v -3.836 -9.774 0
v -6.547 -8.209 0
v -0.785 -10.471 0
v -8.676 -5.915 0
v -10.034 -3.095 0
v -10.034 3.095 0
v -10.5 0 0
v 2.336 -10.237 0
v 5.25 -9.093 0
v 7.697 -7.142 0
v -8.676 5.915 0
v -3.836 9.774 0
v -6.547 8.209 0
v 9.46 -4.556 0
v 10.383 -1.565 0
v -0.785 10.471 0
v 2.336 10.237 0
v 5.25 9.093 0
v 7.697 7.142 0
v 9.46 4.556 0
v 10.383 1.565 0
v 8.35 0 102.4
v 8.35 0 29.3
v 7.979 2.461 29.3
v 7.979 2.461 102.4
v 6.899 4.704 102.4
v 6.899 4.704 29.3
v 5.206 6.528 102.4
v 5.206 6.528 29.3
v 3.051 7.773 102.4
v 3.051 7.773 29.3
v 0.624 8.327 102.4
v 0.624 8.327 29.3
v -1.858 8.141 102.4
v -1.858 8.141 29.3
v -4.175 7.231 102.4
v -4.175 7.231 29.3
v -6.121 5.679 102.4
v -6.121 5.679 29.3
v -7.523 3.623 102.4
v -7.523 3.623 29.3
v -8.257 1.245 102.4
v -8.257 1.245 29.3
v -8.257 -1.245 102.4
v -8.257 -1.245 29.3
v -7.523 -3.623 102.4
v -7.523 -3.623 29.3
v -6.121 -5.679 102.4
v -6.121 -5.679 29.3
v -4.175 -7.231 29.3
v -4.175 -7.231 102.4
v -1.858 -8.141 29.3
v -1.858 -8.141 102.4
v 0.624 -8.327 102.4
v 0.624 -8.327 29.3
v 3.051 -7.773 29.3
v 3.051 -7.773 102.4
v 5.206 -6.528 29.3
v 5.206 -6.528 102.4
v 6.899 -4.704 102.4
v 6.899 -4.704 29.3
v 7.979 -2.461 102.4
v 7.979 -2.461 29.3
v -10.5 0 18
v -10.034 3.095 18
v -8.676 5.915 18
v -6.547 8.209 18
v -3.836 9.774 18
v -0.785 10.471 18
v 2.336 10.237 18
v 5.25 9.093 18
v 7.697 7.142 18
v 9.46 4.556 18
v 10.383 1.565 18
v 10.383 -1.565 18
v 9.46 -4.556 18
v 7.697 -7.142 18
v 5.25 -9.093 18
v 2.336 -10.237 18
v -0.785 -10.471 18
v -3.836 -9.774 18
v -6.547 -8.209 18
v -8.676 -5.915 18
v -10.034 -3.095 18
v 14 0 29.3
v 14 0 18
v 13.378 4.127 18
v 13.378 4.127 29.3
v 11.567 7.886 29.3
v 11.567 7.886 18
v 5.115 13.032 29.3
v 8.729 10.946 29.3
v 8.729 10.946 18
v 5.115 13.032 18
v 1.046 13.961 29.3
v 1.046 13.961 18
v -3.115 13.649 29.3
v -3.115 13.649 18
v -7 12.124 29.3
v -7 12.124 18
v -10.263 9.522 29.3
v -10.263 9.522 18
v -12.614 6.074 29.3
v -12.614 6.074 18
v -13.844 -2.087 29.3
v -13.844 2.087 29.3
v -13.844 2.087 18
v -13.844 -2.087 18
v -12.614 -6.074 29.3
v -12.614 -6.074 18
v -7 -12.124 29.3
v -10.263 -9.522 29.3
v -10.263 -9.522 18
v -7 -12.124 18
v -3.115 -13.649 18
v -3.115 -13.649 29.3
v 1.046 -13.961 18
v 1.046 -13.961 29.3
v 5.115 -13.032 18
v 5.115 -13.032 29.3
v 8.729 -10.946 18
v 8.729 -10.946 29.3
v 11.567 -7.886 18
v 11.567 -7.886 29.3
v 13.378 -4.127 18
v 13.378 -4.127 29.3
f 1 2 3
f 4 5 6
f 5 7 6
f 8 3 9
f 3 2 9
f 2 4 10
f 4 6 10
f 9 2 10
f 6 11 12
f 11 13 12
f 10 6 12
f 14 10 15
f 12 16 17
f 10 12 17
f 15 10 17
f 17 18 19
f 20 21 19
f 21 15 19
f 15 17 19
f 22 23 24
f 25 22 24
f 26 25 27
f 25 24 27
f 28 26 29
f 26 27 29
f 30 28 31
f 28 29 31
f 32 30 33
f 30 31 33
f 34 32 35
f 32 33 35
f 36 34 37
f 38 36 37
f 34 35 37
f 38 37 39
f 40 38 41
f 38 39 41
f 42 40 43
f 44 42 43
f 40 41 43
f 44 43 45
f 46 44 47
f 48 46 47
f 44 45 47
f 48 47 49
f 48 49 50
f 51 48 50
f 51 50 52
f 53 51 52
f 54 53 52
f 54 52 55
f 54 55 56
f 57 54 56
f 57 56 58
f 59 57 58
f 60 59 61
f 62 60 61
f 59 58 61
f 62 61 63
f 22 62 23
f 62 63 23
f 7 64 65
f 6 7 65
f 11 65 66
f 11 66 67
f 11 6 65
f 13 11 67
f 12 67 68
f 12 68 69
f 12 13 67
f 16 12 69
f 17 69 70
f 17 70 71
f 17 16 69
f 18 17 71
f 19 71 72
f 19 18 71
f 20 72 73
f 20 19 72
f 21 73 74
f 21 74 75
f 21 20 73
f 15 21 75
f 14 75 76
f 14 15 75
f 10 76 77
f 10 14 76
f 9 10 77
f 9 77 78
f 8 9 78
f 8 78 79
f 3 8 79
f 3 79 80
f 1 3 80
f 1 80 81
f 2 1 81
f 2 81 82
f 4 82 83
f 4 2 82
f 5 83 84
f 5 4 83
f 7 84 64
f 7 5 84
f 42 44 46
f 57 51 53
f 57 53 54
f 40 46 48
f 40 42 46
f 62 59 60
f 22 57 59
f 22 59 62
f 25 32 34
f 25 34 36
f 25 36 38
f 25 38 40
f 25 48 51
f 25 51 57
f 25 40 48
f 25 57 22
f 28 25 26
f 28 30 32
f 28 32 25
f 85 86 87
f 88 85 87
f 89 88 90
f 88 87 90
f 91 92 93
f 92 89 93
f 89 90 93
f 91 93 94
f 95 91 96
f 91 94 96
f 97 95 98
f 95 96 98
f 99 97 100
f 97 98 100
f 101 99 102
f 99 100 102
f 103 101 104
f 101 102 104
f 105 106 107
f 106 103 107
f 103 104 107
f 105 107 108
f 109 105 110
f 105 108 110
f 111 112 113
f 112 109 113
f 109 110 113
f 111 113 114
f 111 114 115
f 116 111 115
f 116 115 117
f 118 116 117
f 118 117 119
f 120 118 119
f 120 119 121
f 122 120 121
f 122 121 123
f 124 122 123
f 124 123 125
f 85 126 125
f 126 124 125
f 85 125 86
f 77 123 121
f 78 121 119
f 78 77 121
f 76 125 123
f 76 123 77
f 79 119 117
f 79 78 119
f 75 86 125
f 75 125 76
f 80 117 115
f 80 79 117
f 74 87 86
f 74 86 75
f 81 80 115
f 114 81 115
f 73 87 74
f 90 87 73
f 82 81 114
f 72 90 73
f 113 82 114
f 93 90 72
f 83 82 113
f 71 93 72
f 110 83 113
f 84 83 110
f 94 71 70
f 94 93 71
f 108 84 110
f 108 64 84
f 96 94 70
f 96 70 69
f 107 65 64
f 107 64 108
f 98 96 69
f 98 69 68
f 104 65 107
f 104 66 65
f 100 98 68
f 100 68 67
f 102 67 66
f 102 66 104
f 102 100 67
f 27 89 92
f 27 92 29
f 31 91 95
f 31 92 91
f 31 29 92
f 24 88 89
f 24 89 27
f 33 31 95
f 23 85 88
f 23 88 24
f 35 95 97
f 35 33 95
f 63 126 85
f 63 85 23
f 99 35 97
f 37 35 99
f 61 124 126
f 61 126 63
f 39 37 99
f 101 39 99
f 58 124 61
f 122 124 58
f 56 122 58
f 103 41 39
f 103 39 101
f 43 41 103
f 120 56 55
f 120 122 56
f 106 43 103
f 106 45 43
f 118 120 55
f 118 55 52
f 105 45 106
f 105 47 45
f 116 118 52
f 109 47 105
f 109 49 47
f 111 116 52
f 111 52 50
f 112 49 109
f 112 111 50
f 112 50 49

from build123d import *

# Parameters (mm, degrees)
CROQUIS1_R              = 14
SALIENTE_EXTRUIR1_DEPTH = 85
CROQUIS2_OUTSIDE_W      = 48.754
CROQUIS2_OUTSIDE_H      = 48.754
CROQUIS2_OUTSIDE_R      = 10.65
CORTAR_EXTRUIR2_DEPTH   = 18
CORTAR_EXTRUIR3_START   = -55.7
CROQUIS5_R              = 14
CORTAR_EXTRUIR3_DEPTH   = 55.7
CROQUIS6_R              = 8.35
SALIENTE_EXTRUIR2_DEPTH = 73.1
CROQUIS7_OUTSIDE_W      = 51.958
CROQUIS7_OUTSIDE_H      = 51.958
CROQUIS7_OUTSIDE_R      = 10.5
CORTAR_EXTRUIR5_DEPTH   = 18


with BuildPart() as part:
    # Croquis1 → Saliente-Extruir1 (new body)
    with BuildSketch(Plane.XY):
        Circle(CROQUIS1_R)
    extrude(amount=SALIENTE_EXTRUIR1_DEPTH)

    # Croquis2 outside → Cortar-Extruir2 (cut)
    with BuildSketch(Plane(origin=(0, 0, 0), x_dir=(-1, 0, 0), z_dir=(0, 0, -1))):
        Rectangle(CROQUIS2_OUTSIDE_W, CROQUIS2_OUTSIDE_H)
        Circle(CROQUIS2_OUTSIDE_R, mode=Mode.SUBTRACT)
    extrude(amount=-CORTAR_EXTRUIR2_DEPTH, mode=Mode.SUBTRACT)

    # Croquis5 → Cortar-Extruir3 (cut)
    with BuildSketch(Plane.XY.offset(85).offset(CORTAR_EXTRUIR3_START)):
        with Locations(Location((0, 0, 0), (0, 0, 180))):
            Circle(CROQUIS5_R)
    extrude(amount=CORTAR_EXTRUIR3_DEPTH, mode=Mode.SUBTRACT)

    # Croquis6 → Saliente-Extruir2 (add)
    with BuildSketch(Plane.XY.offset(29.3)):
        Circle(CROQUIS6_R)
    extrude(amount=SALIENTE_EXTRUIR2_DEPTH)

    # Croquis7 outside → Cortar-Extruir5 (cut)
    with BuildSketch(Plane(origin=(0, 0, 0), x_dir=(-1, 0, 0), z_dir=(0, 0, -1))):
        Rectangle(CROQUIS7_OUTSIDE_W, CROQUIS7_OUTSIDE_H)
        Circle(CROQUIS7_OUTSIDE_R, mode=Mode.SUBTRACT)
    extrude(amount=-CORTAR_EXTRUIR5_DEPTH, mode=Mode.SUBTRACT)


solid = part.part
